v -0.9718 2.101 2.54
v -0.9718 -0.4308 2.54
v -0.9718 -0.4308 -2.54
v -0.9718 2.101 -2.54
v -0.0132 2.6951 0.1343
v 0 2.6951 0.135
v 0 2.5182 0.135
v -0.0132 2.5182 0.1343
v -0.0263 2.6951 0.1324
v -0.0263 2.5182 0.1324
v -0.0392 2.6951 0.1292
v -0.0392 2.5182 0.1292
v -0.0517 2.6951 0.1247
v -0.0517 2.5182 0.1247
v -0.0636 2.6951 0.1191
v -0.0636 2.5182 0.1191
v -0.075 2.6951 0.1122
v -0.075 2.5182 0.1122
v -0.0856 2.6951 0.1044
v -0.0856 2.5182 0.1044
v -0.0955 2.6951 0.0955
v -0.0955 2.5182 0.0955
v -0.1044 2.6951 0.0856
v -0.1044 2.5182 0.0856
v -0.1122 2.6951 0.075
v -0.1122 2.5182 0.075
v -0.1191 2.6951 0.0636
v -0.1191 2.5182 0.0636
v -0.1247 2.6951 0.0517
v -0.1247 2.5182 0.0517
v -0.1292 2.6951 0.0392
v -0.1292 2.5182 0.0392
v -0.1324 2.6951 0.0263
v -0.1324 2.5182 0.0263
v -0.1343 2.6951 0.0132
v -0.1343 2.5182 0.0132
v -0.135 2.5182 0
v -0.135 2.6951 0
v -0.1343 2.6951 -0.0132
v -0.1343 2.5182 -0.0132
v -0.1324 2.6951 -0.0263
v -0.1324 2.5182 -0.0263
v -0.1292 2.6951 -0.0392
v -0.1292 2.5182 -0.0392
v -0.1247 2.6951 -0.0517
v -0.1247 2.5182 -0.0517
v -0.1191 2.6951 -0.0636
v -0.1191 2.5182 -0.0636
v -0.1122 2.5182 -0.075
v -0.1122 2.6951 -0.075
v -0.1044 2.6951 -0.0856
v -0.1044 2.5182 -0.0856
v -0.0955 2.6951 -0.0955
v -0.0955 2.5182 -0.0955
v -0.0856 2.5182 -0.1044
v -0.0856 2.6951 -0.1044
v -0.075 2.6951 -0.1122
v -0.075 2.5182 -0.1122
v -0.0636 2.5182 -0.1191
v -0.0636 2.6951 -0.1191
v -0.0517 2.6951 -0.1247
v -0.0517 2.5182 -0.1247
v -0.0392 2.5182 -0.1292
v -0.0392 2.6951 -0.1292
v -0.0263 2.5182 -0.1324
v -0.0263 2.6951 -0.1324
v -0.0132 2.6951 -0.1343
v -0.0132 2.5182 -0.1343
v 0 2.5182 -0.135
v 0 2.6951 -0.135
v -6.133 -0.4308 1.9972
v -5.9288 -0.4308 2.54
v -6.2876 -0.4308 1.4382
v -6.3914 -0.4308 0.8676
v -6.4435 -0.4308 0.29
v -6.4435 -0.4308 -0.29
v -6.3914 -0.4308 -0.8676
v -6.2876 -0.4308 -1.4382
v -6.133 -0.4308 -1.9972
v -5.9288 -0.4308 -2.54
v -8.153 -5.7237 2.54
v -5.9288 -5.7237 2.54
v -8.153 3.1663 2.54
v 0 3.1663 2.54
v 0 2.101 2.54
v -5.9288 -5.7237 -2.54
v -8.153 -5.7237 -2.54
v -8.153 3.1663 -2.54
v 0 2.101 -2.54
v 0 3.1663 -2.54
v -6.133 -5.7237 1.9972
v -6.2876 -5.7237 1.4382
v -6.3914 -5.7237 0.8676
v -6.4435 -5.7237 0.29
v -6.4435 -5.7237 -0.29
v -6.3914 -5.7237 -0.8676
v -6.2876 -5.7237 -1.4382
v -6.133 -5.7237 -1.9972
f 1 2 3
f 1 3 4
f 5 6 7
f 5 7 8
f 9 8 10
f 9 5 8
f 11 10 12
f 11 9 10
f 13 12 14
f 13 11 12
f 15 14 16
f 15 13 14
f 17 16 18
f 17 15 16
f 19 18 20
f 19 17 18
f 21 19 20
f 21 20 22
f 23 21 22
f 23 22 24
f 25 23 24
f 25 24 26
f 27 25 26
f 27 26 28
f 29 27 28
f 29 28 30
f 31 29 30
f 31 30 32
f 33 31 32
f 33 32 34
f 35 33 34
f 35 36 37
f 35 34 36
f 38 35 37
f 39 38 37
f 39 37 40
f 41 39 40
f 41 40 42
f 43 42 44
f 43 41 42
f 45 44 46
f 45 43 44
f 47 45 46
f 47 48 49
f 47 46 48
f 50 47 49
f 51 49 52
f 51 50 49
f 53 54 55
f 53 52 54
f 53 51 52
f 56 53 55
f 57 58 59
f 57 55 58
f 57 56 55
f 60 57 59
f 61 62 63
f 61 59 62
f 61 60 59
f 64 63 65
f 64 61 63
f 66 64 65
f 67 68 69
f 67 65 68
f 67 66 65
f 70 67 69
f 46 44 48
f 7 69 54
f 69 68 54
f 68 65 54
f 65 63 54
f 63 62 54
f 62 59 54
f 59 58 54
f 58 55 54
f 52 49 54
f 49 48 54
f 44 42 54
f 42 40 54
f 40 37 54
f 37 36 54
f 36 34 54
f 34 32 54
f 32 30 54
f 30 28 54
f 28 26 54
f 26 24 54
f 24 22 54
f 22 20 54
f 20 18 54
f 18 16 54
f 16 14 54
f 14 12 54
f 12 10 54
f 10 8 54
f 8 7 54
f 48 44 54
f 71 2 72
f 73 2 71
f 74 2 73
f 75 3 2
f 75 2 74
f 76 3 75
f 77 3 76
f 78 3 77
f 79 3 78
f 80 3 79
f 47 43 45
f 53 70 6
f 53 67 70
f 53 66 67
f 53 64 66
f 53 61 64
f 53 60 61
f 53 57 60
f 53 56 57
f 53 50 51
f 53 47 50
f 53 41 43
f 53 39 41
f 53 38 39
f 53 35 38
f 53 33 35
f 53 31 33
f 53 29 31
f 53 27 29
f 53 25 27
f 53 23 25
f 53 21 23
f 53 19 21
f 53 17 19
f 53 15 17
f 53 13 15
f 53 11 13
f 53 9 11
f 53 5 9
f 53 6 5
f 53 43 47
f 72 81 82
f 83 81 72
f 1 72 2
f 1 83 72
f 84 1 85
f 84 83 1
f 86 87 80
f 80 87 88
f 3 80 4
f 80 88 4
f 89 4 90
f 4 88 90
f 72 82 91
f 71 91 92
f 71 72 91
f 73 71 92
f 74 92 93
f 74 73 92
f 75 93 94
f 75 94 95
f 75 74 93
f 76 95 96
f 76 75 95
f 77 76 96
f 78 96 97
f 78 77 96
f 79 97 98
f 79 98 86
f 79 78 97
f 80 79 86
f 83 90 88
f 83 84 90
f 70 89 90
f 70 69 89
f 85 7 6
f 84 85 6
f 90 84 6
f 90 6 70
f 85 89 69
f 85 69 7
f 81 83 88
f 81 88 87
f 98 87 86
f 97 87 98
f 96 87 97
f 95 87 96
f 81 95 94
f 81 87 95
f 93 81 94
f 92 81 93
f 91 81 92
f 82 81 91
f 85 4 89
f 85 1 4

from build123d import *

# Parameters (mm, degrees)
BOSS_EXTRUDE1_DEPTH = 2.54
SKETCH4_W           = 0.135
SKETCH4_H           = 0.17696191
SKETCH4_W_2         = 6.45
SKETCH4_H_2         = 5.360645495


with BuildPart() as part:
    # Sketch2 → Boss-Extrude1 (new, symmetric)
    with BuildSketch(Plane.XY):
        Polygon((0, 3.166258563), (-8.153042882, 3.166258563), (-8.153042882, -5.723741437), (0, -5.723741437), (0, -0.430777301), (-0.971812772, -0.430777301), (-0.971812772, 2.100957578), (0, 2.100957578), align=None)
    extrude(amount=BOSS_EXTRUDE1_DEPTH, both=True)

    # Sketch4 → Cut-Revolve2 (revolve, cut)
    with BuildSketch(Plane.XY):
        with Locations((-0.0675, 2.60664071)):
            Rectangle(SKETCH4_W, SKETCH4_H)
        with Locations((-3.225, -3.111100048)):
            Rectangle(SKETCH4_W_2, SKETCH4_H_2)
    revolve(axis=Axis((0, 5.644041385, 0), (0, -1, 0)), mode=Mode.SUBTRACT)


solid = part.part
